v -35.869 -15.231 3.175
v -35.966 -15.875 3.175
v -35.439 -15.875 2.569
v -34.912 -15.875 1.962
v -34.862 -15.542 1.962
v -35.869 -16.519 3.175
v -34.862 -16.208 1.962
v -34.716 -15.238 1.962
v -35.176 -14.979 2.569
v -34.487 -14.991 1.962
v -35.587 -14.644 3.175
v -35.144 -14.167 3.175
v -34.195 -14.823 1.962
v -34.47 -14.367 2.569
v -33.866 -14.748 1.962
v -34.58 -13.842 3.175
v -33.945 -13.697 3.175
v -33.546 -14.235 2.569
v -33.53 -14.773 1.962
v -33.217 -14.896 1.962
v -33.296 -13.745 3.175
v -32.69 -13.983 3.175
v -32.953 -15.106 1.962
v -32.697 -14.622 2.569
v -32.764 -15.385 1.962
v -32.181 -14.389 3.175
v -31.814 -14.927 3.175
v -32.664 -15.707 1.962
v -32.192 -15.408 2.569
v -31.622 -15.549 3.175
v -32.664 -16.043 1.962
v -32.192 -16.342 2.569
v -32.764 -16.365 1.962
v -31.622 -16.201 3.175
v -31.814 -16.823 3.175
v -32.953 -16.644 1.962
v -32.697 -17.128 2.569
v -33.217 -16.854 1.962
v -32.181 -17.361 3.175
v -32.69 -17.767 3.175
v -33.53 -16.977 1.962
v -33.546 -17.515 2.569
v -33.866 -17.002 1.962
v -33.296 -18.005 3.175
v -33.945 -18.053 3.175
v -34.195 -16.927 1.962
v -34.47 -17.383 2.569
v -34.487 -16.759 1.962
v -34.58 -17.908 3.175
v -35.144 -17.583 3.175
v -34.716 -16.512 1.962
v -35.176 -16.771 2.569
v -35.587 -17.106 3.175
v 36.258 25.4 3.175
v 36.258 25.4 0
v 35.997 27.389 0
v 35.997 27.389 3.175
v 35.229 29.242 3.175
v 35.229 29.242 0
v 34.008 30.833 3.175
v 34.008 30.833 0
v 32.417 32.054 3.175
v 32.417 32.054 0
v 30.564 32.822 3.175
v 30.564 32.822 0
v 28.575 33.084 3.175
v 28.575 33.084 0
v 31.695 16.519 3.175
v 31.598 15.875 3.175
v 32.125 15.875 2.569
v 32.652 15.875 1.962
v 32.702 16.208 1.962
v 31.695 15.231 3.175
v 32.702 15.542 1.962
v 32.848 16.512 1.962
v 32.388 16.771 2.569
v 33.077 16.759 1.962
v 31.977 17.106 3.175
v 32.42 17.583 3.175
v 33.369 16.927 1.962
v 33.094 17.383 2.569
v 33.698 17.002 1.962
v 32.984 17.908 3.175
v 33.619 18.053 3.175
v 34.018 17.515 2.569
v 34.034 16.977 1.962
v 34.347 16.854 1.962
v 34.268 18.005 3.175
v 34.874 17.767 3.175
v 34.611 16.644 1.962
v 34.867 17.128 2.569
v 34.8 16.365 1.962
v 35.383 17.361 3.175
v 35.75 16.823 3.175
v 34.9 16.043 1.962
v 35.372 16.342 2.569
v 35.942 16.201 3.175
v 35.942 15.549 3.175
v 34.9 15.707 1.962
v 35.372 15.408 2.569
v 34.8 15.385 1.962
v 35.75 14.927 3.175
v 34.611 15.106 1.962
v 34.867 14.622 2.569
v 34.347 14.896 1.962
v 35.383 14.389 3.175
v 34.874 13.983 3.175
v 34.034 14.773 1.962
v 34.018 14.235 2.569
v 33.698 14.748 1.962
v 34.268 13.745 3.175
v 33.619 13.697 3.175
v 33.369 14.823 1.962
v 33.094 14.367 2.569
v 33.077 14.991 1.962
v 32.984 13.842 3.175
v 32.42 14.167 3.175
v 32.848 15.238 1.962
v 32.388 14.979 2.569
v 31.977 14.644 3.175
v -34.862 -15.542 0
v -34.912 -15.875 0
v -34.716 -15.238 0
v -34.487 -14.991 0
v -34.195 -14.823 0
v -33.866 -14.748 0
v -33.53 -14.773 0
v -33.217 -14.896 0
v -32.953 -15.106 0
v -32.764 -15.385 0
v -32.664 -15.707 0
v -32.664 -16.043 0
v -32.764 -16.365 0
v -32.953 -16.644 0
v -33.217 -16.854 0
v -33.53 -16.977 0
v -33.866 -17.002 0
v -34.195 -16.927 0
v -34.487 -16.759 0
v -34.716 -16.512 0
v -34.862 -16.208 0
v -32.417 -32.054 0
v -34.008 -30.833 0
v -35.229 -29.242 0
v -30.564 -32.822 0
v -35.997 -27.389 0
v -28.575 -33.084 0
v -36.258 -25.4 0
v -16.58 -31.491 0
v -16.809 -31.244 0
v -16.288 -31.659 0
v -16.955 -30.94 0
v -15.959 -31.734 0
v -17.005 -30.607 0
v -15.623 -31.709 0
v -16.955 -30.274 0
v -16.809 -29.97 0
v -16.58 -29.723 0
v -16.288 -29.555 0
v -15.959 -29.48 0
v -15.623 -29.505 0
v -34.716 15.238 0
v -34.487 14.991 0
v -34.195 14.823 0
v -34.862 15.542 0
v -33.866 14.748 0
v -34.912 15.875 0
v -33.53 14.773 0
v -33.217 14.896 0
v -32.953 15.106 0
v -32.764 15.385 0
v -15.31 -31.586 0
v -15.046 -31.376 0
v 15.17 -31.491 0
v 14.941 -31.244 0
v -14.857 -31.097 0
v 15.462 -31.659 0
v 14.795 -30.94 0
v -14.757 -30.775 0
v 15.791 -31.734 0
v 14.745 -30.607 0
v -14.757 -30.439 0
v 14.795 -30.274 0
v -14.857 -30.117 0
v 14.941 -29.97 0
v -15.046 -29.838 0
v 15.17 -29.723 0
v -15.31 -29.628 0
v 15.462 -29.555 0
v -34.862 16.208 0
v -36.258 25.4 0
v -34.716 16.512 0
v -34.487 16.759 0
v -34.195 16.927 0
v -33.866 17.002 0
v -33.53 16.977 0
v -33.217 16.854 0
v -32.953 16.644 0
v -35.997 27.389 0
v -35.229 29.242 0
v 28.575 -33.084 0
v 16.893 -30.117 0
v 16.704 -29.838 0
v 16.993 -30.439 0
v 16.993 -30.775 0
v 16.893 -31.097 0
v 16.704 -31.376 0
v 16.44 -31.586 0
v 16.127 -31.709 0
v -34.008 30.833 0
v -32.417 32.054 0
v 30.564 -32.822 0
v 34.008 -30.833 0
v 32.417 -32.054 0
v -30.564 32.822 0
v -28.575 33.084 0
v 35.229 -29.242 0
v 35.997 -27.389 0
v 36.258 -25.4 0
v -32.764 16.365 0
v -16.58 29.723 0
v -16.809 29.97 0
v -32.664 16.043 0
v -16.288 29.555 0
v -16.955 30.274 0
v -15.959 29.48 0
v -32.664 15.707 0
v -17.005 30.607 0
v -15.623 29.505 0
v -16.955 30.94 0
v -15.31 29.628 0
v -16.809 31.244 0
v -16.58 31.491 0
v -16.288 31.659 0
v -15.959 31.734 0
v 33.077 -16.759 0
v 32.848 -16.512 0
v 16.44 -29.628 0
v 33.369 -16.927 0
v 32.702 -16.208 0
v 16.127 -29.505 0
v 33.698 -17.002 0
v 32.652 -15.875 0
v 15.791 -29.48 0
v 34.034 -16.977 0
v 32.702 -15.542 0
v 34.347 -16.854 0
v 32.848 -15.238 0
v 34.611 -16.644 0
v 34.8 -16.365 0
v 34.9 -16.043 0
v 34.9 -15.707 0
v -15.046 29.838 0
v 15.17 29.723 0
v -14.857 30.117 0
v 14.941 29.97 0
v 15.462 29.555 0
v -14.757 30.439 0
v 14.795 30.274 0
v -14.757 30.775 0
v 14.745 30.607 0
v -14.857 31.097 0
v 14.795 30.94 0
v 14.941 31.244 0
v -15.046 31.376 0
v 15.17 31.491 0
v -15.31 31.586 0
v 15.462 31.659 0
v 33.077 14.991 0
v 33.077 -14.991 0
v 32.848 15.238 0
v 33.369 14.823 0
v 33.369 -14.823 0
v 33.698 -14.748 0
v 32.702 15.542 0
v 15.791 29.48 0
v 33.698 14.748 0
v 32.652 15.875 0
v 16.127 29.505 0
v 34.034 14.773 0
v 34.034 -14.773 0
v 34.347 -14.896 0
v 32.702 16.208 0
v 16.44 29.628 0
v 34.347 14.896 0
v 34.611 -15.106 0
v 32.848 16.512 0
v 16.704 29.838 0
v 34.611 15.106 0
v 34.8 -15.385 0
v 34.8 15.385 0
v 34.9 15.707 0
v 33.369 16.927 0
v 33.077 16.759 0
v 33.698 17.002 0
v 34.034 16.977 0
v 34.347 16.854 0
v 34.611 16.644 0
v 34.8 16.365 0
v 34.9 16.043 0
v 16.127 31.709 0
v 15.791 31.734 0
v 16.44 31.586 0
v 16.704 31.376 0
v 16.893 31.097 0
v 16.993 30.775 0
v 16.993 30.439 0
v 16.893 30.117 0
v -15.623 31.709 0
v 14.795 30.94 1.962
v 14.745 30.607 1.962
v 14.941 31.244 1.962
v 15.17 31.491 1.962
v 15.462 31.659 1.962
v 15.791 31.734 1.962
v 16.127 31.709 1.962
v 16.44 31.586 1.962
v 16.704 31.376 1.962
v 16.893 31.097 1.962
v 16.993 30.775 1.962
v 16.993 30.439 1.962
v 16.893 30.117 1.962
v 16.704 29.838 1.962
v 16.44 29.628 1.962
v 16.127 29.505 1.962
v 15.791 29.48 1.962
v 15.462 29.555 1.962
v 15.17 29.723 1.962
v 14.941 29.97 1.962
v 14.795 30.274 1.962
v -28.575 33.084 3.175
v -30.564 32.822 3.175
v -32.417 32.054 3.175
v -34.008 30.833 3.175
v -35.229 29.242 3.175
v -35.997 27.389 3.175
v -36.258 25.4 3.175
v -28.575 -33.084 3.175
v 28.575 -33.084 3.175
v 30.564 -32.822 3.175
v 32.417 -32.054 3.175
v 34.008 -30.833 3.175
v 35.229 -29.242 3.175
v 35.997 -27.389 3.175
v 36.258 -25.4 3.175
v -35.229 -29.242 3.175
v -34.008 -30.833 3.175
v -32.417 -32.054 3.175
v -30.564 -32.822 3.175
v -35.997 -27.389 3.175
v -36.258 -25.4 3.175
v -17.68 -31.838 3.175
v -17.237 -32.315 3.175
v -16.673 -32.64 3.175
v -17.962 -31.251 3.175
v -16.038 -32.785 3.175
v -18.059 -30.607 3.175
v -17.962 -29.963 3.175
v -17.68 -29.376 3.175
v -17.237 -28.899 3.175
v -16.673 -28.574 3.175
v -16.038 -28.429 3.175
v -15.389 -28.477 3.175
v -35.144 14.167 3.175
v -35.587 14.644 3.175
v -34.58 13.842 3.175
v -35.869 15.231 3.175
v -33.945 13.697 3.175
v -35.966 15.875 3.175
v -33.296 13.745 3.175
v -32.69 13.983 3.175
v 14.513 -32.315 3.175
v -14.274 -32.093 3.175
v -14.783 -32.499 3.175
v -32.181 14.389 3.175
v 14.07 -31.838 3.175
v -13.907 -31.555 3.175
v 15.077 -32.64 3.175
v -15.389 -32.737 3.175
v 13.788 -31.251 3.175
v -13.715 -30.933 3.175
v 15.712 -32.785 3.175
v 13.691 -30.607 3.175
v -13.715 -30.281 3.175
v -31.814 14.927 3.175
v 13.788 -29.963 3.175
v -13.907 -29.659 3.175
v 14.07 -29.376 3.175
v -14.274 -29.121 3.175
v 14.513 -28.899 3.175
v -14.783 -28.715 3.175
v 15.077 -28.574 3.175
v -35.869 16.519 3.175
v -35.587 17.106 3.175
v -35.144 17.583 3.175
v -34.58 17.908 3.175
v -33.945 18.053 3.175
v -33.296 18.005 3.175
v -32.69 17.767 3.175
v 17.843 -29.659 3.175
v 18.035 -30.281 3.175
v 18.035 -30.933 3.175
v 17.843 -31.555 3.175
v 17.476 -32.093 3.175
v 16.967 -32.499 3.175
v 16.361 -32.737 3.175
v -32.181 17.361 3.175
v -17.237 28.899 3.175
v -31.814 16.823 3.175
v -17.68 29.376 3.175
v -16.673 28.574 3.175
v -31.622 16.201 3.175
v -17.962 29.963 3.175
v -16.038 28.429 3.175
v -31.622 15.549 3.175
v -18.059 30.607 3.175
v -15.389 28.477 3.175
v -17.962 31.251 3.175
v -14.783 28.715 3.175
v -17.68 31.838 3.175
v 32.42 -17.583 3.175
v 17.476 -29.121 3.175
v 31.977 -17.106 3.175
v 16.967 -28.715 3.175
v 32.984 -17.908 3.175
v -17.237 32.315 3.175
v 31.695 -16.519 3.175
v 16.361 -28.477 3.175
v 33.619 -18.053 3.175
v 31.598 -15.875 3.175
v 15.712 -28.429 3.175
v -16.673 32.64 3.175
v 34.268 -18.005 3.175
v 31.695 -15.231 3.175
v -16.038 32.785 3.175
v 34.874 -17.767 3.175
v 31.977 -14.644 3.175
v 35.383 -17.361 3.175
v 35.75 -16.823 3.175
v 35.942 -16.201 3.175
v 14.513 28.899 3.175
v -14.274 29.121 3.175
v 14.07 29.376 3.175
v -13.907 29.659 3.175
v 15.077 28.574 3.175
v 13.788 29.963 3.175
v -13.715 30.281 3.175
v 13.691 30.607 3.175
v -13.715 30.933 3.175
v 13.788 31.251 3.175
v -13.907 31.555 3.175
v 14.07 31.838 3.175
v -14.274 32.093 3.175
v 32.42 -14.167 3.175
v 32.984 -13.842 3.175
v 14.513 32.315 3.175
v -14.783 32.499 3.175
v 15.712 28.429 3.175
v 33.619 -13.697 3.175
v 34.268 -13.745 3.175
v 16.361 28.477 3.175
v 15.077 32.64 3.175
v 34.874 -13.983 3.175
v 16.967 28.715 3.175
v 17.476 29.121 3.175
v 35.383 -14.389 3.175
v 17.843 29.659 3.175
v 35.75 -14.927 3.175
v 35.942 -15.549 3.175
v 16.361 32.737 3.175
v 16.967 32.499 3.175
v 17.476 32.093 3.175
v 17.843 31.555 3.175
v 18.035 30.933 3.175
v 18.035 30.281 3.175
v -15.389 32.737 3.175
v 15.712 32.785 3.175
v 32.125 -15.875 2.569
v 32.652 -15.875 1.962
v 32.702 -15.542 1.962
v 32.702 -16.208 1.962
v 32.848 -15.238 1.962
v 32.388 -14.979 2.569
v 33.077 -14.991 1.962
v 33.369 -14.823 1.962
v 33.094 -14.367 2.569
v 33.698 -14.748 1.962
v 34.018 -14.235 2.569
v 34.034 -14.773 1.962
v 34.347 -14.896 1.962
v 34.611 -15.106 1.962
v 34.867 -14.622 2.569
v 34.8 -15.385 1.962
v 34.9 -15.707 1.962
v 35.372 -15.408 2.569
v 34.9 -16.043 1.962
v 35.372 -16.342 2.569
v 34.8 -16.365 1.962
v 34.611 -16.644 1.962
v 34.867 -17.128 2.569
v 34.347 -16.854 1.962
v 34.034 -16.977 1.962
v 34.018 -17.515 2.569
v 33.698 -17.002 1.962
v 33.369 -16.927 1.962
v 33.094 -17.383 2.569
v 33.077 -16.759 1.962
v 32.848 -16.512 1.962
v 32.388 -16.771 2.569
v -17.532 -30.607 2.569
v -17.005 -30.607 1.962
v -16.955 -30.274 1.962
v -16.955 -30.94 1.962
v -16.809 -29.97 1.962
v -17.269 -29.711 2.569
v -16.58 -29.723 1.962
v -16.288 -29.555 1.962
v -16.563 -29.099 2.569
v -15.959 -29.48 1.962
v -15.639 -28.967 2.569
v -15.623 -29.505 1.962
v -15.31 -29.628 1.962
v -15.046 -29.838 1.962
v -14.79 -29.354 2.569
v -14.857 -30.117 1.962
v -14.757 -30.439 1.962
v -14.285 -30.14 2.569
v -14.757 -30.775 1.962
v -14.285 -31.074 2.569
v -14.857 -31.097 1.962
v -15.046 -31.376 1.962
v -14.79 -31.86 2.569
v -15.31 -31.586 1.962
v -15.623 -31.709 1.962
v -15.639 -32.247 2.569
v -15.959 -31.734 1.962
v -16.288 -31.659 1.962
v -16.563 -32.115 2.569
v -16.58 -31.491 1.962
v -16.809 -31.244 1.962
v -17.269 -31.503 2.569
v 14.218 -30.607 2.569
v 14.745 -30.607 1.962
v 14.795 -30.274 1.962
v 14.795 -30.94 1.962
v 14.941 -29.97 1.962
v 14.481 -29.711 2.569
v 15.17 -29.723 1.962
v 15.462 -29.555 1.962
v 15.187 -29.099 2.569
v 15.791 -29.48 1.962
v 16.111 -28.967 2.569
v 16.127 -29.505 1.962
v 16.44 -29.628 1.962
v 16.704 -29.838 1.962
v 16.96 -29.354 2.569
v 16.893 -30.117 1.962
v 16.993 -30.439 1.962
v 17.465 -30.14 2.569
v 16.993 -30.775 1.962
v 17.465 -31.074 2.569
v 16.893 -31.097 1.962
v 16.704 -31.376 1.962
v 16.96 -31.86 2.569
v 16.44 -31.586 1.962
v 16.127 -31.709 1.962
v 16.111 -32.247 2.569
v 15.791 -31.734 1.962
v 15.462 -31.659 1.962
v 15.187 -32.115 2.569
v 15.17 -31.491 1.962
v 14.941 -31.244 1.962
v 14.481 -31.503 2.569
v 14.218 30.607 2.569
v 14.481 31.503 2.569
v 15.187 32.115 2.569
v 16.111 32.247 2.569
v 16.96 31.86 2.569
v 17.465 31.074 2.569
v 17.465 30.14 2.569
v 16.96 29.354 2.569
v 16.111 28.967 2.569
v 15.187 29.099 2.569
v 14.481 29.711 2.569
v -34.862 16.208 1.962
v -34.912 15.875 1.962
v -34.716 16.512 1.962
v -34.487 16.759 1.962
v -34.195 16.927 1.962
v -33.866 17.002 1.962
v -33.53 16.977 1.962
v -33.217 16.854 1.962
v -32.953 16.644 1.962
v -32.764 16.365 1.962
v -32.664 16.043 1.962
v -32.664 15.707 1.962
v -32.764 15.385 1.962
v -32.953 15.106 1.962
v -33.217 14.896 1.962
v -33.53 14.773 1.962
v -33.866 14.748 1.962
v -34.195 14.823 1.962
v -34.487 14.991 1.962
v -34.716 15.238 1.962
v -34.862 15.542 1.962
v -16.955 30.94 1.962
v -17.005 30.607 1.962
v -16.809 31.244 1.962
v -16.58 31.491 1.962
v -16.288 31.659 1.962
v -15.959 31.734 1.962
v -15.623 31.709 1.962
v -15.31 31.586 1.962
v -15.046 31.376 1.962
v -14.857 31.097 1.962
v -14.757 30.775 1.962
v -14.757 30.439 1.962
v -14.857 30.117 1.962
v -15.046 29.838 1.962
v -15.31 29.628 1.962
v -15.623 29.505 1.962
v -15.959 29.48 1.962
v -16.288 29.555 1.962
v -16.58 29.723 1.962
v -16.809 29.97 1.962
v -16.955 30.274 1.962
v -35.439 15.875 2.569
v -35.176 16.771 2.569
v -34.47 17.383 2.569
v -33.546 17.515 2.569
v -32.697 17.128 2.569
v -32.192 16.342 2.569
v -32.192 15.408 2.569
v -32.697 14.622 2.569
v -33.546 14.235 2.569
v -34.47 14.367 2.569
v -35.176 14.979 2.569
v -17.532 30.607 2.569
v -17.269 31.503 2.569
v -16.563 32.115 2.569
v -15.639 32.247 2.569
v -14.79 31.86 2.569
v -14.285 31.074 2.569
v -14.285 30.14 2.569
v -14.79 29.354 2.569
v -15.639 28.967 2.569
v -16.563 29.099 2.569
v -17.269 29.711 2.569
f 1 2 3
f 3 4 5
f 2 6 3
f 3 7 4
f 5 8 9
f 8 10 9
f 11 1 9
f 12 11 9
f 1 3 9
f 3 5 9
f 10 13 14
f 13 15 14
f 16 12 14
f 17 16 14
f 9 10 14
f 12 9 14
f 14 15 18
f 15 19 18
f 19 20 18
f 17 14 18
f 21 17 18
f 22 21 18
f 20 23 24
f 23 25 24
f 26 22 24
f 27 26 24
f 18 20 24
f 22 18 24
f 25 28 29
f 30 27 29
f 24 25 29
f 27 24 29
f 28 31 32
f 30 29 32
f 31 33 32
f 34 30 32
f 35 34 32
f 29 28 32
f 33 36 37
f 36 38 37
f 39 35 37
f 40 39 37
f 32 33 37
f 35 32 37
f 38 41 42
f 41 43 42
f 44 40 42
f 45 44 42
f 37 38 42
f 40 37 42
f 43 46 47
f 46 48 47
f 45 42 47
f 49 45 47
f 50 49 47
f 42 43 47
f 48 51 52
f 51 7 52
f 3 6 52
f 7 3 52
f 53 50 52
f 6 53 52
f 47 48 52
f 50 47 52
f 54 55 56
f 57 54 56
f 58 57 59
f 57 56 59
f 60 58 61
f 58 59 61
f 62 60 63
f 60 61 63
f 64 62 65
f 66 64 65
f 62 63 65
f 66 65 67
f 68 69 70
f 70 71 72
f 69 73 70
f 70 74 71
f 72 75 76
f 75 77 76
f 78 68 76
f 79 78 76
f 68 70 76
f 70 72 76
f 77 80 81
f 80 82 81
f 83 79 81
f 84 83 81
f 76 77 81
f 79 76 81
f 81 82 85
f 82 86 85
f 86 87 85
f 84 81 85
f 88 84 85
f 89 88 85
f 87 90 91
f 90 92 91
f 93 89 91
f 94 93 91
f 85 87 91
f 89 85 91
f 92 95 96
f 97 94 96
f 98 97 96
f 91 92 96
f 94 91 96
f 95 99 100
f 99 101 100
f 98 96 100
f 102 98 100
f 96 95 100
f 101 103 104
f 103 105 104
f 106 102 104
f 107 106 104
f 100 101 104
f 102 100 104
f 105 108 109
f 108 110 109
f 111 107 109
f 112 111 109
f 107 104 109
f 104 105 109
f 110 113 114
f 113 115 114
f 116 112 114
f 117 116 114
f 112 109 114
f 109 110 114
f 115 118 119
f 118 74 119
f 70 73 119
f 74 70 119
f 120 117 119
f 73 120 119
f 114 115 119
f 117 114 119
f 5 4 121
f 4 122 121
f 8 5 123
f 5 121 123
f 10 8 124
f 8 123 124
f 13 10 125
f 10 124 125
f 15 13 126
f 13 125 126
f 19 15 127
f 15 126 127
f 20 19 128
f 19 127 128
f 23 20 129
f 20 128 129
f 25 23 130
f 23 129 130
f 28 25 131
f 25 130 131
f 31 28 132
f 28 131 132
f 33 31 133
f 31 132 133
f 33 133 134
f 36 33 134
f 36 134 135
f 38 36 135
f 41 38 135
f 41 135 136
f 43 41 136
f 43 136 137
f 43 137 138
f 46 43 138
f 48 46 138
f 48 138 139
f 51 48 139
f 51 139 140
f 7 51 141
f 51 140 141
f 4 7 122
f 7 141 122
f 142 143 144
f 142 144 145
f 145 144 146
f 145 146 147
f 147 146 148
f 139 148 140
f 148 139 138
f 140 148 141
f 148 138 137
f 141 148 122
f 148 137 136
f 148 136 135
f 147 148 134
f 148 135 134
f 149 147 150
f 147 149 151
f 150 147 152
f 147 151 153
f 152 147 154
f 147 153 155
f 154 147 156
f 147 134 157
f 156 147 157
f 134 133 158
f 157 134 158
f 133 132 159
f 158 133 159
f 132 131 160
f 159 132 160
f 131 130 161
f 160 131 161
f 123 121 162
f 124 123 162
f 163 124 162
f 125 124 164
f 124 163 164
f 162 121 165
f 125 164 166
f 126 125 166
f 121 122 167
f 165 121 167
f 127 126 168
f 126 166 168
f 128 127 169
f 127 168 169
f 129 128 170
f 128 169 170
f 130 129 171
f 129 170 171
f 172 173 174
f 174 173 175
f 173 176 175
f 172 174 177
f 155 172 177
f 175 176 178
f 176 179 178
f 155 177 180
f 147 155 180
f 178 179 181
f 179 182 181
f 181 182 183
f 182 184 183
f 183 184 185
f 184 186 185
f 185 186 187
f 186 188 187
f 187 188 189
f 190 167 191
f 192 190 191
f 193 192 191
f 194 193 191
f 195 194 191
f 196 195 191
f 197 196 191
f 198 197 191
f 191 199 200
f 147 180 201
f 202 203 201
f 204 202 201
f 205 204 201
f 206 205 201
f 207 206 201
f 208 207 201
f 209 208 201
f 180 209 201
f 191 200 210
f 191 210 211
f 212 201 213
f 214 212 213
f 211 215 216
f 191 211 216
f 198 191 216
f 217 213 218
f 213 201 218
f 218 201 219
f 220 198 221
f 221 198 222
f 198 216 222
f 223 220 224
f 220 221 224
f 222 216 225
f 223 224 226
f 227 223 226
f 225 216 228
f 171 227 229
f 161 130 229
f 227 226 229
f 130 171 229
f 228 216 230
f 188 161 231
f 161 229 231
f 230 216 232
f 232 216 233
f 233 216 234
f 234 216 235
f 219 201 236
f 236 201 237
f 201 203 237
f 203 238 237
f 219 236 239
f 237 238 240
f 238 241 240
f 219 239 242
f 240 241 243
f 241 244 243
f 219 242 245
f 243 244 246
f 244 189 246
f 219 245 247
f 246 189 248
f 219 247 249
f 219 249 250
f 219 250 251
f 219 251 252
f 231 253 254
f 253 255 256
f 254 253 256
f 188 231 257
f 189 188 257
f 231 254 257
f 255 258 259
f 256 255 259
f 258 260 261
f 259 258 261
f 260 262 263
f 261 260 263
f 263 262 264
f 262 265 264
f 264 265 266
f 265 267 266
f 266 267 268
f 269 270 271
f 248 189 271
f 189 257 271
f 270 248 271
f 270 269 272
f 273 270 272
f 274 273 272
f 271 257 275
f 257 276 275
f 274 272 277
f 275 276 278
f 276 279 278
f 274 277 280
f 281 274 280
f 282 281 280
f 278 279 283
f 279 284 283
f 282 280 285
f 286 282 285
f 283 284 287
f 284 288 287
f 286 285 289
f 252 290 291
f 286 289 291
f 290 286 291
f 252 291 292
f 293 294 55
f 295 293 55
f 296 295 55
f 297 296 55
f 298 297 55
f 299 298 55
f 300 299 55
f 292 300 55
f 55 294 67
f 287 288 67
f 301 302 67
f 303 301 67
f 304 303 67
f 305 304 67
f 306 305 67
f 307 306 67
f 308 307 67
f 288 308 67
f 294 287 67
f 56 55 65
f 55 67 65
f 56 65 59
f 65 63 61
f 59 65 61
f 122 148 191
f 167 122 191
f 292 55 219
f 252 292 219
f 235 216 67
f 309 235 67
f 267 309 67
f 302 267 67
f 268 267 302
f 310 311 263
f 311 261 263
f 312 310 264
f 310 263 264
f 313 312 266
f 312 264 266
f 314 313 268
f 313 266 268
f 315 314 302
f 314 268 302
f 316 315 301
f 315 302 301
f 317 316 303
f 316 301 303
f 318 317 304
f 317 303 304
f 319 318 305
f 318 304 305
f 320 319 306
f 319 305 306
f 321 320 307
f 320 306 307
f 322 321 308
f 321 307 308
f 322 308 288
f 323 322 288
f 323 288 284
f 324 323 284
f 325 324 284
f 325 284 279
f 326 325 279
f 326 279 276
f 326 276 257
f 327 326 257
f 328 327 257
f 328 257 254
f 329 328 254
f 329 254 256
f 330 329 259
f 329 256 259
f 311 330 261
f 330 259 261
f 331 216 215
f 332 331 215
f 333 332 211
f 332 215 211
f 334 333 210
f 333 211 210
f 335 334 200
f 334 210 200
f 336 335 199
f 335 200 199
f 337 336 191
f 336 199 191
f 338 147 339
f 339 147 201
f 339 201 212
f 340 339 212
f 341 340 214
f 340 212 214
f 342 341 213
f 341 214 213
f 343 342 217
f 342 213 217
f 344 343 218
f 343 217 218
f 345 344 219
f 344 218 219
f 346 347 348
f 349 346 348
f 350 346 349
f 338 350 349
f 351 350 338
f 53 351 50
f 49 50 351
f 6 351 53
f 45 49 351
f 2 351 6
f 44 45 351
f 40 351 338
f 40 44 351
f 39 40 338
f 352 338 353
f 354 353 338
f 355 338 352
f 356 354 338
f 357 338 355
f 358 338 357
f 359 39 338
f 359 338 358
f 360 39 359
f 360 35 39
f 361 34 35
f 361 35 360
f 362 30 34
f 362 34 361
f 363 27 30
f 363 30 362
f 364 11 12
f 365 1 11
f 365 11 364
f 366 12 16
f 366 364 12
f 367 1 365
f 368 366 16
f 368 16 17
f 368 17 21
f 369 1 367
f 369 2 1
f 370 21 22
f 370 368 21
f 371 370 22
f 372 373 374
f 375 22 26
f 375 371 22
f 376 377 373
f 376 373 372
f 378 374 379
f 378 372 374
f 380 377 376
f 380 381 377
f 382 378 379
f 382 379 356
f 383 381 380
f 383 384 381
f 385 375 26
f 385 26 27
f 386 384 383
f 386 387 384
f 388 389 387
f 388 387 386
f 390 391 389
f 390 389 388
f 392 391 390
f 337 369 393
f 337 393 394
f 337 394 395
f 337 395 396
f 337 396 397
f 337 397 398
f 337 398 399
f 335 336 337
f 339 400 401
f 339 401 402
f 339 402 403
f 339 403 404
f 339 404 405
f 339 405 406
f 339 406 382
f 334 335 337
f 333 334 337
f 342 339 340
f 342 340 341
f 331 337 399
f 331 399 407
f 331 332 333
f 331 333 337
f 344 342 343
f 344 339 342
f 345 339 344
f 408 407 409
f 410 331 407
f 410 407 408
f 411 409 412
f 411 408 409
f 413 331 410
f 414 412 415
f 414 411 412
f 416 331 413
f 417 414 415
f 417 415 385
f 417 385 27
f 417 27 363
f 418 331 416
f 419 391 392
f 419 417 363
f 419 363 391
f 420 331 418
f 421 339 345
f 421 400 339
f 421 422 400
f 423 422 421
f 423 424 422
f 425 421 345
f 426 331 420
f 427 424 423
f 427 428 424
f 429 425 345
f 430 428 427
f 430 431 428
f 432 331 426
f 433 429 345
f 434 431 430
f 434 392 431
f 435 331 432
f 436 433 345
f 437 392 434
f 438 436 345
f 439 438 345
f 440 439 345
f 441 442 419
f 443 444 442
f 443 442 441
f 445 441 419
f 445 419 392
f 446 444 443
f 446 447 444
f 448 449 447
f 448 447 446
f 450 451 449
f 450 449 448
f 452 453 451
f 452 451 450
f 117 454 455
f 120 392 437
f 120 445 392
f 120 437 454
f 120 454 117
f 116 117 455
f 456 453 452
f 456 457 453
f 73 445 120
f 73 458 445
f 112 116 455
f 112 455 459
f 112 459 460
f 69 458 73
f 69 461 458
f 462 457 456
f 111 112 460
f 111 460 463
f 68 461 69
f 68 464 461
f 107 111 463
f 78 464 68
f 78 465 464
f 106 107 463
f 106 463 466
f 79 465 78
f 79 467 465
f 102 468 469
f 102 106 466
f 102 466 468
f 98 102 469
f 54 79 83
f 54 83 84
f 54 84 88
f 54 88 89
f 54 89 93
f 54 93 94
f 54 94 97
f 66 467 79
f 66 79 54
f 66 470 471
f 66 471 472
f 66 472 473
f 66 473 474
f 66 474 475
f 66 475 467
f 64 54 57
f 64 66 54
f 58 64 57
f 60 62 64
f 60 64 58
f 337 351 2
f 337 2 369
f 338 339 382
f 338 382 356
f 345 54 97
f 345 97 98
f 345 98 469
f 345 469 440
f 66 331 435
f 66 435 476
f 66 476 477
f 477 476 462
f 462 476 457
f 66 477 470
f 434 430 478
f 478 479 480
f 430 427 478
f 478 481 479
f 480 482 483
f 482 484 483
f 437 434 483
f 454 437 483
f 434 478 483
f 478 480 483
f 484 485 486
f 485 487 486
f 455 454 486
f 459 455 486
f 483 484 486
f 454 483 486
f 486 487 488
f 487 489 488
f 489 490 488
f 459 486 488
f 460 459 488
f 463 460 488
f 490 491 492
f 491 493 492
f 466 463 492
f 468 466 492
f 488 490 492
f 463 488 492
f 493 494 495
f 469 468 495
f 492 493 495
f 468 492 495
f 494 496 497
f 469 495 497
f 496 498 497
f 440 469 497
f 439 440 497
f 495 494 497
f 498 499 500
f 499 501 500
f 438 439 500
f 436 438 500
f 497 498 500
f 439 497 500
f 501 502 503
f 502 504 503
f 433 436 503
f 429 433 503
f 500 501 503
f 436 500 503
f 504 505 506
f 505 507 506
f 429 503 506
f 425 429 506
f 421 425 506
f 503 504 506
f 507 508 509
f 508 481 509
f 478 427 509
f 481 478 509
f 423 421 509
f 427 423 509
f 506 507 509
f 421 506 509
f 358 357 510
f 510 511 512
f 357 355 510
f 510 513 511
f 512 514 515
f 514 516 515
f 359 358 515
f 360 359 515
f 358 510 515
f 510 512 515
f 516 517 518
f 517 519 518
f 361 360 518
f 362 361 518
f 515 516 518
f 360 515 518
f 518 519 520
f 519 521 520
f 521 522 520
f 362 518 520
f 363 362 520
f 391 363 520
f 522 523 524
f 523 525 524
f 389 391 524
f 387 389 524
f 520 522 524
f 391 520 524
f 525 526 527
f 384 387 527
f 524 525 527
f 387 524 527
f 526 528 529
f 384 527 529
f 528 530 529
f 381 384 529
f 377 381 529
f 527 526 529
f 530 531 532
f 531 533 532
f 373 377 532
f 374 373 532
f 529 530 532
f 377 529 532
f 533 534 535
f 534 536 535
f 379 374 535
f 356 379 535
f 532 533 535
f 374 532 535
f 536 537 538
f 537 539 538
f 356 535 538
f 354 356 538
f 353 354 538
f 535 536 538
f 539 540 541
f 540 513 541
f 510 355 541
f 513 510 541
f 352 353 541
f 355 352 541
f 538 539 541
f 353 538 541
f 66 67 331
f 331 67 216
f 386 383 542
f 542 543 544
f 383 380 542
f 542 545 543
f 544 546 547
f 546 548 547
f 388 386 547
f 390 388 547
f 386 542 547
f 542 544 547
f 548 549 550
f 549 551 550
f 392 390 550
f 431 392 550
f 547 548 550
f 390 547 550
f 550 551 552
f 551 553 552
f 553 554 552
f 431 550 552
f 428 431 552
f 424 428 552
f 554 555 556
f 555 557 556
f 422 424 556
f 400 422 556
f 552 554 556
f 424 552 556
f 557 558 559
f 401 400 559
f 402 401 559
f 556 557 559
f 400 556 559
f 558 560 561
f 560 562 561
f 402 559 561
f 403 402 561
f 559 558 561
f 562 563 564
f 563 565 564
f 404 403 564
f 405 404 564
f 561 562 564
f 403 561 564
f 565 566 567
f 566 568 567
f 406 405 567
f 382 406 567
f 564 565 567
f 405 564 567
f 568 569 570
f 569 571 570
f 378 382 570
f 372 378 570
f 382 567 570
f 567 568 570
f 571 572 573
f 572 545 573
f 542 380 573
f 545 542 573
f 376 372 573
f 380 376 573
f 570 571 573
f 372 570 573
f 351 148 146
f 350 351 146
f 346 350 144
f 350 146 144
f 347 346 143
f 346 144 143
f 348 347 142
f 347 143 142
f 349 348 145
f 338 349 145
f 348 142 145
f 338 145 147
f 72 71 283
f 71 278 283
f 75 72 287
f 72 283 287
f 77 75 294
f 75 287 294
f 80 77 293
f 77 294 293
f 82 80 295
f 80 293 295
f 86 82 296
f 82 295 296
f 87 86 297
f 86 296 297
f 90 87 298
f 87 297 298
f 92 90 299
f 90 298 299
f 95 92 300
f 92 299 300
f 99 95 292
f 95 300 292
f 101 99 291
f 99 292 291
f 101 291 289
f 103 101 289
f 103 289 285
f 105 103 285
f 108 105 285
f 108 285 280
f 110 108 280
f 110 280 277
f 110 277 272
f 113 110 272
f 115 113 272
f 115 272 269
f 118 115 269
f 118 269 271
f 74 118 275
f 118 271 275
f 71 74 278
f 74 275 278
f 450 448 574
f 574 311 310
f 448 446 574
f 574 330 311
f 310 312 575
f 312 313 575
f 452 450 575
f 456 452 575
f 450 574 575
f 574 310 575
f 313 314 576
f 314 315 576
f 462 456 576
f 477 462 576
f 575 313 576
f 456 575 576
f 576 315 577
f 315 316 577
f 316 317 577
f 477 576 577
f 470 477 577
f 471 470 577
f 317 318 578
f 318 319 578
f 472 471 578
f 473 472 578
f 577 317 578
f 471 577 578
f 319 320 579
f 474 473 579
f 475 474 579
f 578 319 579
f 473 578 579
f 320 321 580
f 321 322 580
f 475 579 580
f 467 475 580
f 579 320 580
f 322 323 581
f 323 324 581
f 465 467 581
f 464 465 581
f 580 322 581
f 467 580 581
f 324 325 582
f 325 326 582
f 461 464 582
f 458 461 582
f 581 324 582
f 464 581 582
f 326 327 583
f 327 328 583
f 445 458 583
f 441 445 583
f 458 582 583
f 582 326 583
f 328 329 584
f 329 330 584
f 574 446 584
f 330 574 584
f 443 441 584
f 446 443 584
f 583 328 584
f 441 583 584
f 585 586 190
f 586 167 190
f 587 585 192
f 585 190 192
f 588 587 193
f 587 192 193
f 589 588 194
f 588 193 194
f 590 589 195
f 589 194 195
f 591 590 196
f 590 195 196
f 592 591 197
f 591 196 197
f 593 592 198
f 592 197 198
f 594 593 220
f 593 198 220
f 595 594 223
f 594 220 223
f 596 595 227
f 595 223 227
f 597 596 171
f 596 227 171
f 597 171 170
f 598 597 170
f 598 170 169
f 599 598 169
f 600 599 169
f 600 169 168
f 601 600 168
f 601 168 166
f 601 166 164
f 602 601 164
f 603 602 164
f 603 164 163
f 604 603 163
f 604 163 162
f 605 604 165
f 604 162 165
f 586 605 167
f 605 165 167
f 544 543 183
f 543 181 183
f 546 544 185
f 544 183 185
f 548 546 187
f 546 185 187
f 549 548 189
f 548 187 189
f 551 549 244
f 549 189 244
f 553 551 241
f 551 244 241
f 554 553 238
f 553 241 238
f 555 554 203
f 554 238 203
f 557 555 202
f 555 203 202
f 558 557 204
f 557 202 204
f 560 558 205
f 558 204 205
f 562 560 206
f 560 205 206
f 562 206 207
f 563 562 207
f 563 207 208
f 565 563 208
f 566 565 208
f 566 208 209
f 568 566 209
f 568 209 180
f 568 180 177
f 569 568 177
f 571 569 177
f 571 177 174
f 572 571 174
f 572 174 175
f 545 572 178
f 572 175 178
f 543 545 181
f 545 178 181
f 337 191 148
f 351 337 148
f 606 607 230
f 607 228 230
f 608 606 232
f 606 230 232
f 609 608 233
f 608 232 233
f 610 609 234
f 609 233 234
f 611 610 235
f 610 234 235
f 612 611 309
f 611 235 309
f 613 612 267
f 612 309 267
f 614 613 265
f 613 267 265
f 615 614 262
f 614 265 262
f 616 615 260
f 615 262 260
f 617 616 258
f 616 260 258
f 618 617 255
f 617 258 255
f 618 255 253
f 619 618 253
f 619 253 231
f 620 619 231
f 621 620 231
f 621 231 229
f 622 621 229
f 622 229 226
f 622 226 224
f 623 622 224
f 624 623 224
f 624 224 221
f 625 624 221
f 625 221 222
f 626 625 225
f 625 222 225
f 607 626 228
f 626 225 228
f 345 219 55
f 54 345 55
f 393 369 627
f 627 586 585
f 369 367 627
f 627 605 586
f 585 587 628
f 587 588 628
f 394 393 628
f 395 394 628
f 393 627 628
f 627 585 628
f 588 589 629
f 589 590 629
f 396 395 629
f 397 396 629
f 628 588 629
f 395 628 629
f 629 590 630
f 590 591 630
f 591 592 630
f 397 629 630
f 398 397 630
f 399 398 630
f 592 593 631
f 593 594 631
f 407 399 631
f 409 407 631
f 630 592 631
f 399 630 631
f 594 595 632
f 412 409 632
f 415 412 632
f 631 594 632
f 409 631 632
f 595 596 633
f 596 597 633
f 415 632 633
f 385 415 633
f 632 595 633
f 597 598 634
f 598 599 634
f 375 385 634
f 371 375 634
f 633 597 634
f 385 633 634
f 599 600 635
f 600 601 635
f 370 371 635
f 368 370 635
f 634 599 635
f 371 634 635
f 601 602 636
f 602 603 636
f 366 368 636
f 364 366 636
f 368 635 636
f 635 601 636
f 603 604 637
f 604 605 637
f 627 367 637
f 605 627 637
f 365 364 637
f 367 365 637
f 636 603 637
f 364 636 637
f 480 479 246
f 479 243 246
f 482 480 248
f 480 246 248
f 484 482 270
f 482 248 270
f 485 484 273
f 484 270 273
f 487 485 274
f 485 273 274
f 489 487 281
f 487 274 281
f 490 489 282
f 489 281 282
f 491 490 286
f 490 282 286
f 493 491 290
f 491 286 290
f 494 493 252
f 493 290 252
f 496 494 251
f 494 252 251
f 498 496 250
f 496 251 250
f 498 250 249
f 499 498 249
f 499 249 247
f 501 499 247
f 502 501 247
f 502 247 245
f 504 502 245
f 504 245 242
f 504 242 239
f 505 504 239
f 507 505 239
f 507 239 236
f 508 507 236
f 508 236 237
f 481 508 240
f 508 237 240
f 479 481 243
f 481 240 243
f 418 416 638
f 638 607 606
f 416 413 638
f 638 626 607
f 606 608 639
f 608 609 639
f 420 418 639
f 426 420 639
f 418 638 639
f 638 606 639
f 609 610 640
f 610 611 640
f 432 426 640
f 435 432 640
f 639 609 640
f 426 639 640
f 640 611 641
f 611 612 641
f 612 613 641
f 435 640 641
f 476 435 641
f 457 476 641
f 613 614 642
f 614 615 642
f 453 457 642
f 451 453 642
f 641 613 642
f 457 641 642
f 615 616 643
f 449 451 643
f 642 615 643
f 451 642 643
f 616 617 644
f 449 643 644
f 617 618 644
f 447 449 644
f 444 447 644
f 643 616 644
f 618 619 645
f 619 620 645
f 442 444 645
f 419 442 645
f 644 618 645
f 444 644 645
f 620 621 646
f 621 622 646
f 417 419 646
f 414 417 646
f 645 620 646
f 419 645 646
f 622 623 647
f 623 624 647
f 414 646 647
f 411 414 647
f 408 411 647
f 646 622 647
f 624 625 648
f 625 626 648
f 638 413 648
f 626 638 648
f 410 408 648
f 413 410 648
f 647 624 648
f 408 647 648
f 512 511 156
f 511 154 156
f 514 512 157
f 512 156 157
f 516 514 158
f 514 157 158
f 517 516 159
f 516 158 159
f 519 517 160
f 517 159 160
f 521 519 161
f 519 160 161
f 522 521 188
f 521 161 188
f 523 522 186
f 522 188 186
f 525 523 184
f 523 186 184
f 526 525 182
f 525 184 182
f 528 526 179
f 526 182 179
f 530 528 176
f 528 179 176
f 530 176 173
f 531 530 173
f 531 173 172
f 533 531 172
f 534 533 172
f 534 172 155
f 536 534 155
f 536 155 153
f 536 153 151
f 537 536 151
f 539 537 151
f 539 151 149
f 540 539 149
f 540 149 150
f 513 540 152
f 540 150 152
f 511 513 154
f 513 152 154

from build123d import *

# Parameters (mm, degrees)
BOSS_EXTRUDE1_DEPTH                            = 3.175
CSK_FOR_2_FLAT_HEAD_MACHINE_SCREW1_D           = 2.2606
CSK_FOR_2_FLAT_HEAD_MACHINE_SCREW1_CSINK_D     = 4.3688
CSK_FOR_2_FLAT_HEAD_MACHINE_SCREW1_CSINK_ANGLE = 82


with BuildPart() as part:
    # Sketch1 → Boss-Extrude1 (new body)
    with BuildSketch(Plane.XY):
        with BuildLine():
            Line((-36.2585, 25.4), (-36.2585, -25.4))
            ThreePointArc((-36.2585, -25.4), (-34.008054953, -30.833054953), (-28.575, -33.0835))
            Line((-28.575, -33.0835), (28.575, -33.0835))
            ThreePointArc((28.575, -33.0835), (34.008054953, -30.833054953), (36.2585, -25.4))
            Line((36.2585, -25.4), (36.2585, 25.4))
            ThreePointArc((36.2585, 25.4), (34.008054953, 30.833054953), (28.575, 33.0835))
            Line((28.575, 33.0835), (-28.575, 33.0835))
            ThreePointArc((-28.575, 33.0835), (-34.008054953, 30.833054953), (-36.2585, 25.4))
        make_face()
    extrude(amount=BOSS_EXTRUDE1_DEPTH)

    # CSK for #2 Flat Head Machine Screw1 (through all)
    with Locations(Plane(origin=(13.435602358, 90.246811513, 3.175), x_dir=(1, 0, 0), z_dir=(0, 0, 1))):
        with Locations((-29.310602358, -59.639811513), (-47.217602358, -74.371811513), (-47.217602358, -106.121811513), (-29.310602358, -120.853811513), (2.439397642, -120.853811513), (20.346397642, -106.121811513), (20.346397642, -74.371811513), (2.439397642, -59.639811513)):
            CounterSinkHole(CSK_FOR_2_FLAT_HEAD_MACHINE_SCREW1_D / 2, CSK_FOR_2_FLAT_HEAD_MACHINE_SCREW1_CSINK_D / 2, counter_sink_angle=CSK_FOR_2_FLAT_HEAD_MACHINE_SCREW1_CSINK_ANGLE)


solid = part.part
